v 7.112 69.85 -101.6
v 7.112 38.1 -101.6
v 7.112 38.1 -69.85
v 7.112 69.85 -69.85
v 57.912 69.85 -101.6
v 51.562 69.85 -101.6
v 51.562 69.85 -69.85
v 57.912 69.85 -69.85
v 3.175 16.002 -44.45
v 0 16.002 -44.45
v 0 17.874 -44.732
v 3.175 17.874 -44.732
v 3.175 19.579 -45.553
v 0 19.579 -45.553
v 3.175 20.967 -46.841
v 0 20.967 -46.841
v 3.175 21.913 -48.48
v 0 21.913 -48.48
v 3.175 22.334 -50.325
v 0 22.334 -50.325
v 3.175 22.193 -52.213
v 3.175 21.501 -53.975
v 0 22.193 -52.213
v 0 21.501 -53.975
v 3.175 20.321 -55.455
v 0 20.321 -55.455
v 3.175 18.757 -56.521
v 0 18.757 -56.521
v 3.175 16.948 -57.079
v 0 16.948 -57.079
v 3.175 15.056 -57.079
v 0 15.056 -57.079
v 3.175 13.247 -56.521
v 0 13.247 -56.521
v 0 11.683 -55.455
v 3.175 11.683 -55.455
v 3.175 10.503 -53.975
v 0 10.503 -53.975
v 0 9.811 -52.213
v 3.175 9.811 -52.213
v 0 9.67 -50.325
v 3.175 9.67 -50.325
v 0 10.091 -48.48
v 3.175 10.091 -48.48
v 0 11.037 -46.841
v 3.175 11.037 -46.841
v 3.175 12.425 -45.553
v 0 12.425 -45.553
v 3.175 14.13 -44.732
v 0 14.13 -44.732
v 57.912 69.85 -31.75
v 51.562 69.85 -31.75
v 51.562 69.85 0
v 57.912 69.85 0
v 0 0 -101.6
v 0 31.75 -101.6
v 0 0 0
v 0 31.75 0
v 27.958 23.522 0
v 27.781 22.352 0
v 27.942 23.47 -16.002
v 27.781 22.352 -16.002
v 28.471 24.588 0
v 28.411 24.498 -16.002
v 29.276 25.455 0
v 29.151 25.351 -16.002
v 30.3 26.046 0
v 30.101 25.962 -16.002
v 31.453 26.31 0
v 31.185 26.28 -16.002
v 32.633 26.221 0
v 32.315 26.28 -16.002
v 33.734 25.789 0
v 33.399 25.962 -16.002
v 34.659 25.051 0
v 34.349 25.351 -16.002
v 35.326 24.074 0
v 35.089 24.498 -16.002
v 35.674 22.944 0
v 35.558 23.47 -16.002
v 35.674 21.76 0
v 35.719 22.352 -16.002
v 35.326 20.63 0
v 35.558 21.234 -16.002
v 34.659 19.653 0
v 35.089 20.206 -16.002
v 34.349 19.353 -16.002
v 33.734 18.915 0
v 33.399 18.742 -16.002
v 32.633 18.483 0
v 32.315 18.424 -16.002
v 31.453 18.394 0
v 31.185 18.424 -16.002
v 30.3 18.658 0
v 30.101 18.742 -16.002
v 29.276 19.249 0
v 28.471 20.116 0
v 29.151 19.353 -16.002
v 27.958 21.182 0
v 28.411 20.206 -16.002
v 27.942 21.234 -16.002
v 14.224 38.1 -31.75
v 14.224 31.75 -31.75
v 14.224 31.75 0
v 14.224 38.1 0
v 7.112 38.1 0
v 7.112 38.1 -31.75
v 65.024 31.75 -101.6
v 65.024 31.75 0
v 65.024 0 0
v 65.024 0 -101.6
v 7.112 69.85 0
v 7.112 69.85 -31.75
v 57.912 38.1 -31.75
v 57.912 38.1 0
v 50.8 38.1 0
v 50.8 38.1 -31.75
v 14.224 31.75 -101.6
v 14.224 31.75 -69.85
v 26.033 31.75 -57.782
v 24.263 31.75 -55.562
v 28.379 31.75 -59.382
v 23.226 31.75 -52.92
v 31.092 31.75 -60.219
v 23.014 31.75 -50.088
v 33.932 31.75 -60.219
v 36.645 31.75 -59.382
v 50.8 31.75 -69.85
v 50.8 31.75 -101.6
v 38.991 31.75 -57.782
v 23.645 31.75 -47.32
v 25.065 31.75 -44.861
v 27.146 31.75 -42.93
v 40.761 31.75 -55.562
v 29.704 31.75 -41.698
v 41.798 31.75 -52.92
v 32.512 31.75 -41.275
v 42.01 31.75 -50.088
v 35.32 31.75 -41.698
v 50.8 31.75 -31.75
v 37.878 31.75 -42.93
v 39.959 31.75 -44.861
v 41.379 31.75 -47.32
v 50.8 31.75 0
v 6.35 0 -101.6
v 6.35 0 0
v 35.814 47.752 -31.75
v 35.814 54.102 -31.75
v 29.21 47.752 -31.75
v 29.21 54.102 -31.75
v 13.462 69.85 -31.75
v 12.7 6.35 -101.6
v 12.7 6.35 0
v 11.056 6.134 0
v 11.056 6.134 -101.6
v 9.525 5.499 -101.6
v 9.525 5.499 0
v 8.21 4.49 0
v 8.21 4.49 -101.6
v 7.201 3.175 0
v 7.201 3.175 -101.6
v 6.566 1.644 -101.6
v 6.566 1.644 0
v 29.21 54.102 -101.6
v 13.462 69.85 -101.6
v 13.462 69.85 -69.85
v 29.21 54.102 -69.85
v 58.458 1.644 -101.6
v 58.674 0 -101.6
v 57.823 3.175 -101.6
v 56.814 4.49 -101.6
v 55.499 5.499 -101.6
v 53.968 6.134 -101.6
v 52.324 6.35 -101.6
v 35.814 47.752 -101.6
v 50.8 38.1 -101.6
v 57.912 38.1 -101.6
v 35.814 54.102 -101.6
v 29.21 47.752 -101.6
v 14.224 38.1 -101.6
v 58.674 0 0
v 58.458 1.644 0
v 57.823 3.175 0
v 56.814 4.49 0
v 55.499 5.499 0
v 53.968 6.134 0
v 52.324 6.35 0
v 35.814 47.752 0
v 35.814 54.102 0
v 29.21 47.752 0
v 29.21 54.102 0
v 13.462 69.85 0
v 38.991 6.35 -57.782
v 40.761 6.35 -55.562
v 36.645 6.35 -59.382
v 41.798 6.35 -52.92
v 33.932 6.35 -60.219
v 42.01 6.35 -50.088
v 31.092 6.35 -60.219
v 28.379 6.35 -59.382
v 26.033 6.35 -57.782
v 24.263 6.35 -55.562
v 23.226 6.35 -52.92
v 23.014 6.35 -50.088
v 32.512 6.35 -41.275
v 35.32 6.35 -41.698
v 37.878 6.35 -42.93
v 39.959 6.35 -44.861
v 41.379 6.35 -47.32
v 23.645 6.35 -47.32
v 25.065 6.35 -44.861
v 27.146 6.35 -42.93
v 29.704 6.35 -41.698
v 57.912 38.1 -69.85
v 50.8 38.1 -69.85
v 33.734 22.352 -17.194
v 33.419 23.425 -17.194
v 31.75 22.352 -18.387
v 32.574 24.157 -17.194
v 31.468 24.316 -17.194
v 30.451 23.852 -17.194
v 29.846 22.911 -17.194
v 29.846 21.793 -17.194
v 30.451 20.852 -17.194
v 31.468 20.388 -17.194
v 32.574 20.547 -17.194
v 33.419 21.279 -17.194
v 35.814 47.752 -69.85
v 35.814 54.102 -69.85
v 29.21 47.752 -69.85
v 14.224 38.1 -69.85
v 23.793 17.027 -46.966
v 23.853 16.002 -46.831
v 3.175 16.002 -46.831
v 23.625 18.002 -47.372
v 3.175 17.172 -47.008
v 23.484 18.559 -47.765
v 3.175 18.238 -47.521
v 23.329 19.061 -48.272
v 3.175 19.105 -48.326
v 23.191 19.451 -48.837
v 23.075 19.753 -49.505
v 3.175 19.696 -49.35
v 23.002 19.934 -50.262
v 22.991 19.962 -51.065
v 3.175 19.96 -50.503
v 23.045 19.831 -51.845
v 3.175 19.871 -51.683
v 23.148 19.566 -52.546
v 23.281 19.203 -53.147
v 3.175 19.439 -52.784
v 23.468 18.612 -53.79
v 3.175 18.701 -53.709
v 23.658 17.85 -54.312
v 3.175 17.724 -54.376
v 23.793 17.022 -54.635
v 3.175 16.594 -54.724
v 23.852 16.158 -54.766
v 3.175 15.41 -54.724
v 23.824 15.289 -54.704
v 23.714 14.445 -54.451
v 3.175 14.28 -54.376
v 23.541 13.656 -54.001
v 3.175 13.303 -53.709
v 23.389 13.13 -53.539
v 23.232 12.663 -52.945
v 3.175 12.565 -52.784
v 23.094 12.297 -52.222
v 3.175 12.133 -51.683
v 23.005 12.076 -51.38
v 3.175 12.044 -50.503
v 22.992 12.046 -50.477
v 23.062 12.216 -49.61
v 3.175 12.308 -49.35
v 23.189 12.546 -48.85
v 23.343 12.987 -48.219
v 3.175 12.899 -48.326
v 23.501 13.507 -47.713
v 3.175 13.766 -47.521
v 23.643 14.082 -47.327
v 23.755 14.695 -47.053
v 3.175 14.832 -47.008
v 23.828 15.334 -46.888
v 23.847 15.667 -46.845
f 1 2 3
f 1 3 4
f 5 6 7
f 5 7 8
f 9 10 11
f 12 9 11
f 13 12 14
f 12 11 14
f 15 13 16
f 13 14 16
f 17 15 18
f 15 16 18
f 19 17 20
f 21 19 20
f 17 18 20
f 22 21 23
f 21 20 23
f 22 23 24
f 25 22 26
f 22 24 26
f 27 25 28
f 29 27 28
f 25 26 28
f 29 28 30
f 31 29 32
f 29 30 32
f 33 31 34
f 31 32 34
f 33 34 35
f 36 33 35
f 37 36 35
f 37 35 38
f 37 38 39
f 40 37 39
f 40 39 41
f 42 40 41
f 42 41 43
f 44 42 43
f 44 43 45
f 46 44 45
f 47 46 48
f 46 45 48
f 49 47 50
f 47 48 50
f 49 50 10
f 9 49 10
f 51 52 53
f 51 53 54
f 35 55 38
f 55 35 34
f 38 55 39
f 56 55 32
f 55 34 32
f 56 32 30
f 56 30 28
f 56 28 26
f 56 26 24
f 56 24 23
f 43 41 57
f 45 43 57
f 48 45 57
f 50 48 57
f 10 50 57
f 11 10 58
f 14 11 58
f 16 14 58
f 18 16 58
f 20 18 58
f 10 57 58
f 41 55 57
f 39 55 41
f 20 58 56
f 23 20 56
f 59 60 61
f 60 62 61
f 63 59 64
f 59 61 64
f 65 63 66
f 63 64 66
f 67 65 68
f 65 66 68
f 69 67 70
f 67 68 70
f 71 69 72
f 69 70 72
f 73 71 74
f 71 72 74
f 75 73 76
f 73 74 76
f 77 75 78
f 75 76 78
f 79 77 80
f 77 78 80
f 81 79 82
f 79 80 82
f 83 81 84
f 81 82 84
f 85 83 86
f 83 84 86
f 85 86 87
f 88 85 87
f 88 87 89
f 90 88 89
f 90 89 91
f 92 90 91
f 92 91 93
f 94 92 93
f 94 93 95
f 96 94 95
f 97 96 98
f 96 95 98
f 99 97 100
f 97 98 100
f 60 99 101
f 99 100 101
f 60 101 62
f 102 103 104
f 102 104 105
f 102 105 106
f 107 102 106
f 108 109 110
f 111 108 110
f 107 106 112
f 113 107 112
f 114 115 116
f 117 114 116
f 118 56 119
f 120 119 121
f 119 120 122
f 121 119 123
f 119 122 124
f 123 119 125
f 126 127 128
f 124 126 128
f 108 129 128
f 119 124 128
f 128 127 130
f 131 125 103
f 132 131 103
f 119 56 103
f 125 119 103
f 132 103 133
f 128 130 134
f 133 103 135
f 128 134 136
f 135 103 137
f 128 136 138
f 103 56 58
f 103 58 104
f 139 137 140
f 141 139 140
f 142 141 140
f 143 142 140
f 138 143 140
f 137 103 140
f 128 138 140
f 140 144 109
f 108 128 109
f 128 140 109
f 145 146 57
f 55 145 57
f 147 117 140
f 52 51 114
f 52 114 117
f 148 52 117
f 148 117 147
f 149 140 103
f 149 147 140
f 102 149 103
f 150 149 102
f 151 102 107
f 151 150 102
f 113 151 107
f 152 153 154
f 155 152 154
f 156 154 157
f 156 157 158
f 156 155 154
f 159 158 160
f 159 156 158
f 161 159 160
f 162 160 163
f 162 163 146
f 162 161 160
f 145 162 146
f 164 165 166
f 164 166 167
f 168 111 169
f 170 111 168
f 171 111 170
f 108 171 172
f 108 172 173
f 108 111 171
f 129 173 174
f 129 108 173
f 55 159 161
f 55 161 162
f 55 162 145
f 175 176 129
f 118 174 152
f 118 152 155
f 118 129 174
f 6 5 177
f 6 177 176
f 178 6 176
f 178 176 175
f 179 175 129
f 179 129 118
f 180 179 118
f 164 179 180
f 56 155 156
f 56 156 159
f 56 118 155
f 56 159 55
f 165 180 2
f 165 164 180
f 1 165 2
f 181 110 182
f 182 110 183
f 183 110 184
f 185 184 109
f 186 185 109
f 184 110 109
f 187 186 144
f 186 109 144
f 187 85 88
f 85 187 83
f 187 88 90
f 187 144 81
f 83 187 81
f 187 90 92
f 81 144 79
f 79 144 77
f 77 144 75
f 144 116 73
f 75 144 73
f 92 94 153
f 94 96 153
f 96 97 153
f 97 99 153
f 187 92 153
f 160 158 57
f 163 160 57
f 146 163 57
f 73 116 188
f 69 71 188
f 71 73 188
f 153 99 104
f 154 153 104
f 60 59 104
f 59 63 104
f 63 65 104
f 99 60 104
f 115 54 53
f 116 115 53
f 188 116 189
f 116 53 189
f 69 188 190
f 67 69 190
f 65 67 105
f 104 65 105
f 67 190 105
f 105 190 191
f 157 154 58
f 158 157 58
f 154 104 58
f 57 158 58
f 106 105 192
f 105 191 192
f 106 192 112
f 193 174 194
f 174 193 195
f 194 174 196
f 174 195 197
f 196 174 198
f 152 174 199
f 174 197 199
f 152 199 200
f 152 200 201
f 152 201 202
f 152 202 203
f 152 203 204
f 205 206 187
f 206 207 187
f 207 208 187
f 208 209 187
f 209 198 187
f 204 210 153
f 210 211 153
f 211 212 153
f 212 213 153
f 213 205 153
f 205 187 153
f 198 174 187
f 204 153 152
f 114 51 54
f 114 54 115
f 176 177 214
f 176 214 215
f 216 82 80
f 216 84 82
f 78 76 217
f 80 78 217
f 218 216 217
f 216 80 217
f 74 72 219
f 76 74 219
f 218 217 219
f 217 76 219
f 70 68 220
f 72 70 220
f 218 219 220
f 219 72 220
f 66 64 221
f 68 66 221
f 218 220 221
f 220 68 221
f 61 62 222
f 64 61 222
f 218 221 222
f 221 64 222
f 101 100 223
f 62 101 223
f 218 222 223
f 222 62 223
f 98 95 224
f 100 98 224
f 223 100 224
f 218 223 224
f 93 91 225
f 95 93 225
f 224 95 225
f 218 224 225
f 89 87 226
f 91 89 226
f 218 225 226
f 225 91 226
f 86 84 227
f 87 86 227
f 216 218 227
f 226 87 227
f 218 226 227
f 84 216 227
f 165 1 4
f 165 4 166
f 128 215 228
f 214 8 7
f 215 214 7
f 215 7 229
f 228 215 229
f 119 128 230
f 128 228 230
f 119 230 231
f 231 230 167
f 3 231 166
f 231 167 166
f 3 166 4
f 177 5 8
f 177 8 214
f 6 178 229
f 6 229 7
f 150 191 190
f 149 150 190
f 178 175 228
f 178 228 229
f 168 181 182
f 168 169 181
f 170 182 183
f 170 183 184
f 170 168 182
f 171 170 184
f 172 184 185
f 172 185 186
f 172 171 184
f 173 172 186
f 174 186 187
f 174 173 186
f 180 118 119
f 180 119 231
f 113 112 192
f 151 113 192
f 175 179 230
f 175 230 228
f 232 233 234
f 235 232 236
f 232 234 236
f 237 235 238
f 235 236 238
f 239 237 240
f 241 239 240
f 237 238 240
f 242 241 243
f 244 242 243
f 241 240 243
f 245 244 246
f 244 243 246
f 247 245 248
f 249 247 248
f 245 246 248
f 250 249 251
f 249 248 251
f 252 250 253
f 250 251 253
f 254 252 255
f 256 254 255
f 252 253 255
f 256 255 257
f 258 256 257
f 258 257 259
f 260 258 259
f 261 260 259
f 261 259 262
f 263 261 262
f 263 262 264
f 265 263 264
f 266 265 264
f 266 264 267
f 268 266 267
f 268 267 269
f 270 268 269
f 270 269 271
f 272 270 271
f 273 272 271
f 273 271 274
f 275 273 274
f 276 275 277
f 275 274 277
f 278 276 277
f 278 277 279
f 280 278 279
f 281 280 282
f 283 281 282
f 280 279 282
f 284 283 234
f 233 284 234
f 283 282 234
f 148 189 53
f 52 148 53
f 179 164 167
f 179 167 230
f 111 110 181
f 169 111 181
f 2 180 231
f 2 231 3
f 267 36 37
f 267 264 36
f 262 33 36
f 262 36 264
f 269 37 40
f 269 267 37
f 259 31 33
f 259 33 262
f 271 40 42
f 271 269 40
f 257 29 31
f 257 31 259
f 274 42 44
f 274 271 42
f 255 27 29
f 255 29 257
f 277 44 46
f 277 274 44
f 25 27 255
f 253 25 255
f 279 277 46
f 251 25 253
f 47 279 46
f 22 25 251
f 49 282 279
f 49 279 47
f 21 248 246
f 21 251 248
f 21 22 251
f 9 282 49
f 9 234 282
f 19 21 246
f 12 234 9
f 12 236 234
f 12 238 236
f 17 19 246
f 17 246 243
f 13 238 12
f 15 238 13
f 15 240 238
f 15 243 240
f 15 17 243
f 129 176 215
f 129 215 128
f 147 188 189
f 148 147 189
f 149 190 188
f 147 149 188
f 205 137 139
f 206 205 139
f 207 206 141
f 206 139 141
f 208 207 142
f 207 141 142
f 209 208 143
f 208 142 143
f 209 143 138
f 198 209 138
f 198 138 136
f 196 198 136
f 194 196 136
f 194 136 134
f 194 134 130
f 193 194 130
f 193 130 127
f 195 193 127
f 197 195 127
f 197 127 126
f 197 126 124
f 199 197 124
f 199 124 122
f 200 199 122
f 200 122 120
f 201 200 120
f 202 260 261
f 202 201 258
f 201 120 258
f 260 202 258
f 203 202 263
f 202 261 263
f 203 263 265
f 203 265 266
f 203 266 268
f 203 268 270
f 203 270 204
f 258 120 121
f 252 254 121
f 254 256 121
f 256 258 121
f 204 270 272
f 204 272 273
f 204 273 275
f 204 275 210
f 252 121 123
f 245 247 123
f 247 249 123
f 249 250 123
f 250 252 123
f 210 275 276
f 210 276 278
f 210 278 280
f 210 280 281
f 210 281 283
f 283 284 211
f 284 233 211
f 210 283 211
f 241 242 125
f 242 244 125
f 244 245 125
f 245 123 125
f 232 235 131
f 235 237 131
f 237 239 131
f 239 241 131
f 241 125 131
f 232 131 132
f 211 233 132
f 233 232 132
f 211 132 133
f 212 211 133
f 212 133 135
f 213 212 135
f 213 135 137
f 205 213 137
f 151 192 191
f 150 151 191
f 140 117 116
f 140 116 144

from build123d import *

# Parameters (mm, degrees)
BOSS_EXTRUDE1_DEPTH          = 101.6
FILLET1_R                    = 6.35
F_3_8_16_TAPPED_HOLE2_D      = 7.9375
F_3_8_16_TAPPED_HOLE2_DEPTH  = 16.002
F_3_8_16_TAPPED_HOLE2_TIP    = 2.384665582
SKETCH7_R                    = 9.525
CUT_EXTRUDE1_DEPTH           = 125.734690748
BOSS_EXTRUDE2_DEPTH          = 31.75
BOSS_EXTRUDE3_START          = -101.6
BOSS_EXTRUDE3_DEPTH          = 31.75
SKETCH9_R                    = 6.35
CUT_EXTRUDE2_DEPTH           = 3.175
F_3_8_16_TAPPED_HOLE3_REACH  = 139.938
F_3_8_16_TAPPED_HOLE3_BORE_R = 3.96875


with BuildPart() as part:
    # Sketch1 → Boss-Extrude1 (new body)
    with BuildSketch(Plane.XY):
        Polygon((0, 0), (0, 31.75), (65.024, 31.75), (65.024, 0), (58.674, 0), (58.674, 6.35), (6.35, 6.35), (6.35, 0), align=None)
    extrude(amount=-BOSS_EXTRUDE1_DEPTH)

    # Fillet1
    fillet1_edges = [part.edges().sort_by_distance(p)[0] for p in [
        (58.674, 6.35, -50.8),
        (6.35, 6.35, -50.8),
    ]]
    fillet(fillet1_edges, radius=FILLET1_R - 0.0001)  # a hair under: the kernel refuses the full size

    # 3/8-16 Tapped Hole2
    with Locations(Plane.XY):
        with Locations((31.75, 22.352)):
            Hole(F_3_8_16_TAPPED_HOLE2_D / 2, depth=F_3_8_16_TAPPED_HOLE2_DEPTH)
            with Locations((0, 0, -(F_3_8_16_TAPPED_HOLE2_DEPTH + F_3_8_16_TAPPED_HOLE2_TIP / 2))):  # 118° drill point
                Cone(0, F_3_8_16_TAPPED_HOLE2_D / 2, F_3_8_16_TAPPED_HOLE2_TIP, mode=Mode.SUBTRACT)

    # Sketch7 → Cut-Extrude1 (cut, through all)
    with BuildSketch(Plane(origin=(0, 31.75, 0), x_dir=(1, 0, 0), z_dir=(0, 1, 0))):
        with Locations(Location((32.512, 50.8, 0), (0, 0, 270))):
            Circle(SKETCH7_R)
    extrude(amount=-CUT_EXTRUDE1_DEPTH, mode=Mode.SUBTRACT)

    # Sketch8 → Boss-Extrude2 (add)
    with BuildSketch(Plane.XY):
        Polygon((14.224, 31.75), (14.224, 38.1), (7.112, 38.1), (7.112, 69.85), (13.462, 69.85), (29.21, 54.102), (29.21, 47.752), (35.814, 47.752), (35.814, 54.102), (51.562, 69.85), (57.912, 69.85), (57.912, 38.1), (50.8, 38.1), (50.8, 31.75), align=None)
    extrude(amount=-BOSS_EXTRUDE2_DEPTH)

    # Sketch8<3> → Boss-Extrude3 (add)
    with BuildSketch(Plane.XY.offset(BOSS_EXTRUDE3_START)):
        Polygon((14.224, 31.75), (14.224, 38.1), (7.112, 38.1), (7.112, 69.85), (13.462, 69.85), (29.21, 54.102), (29.21, 47.752), (35.814, 47.752), (35.814, 54.102), (51.562, 69.85), (57.912, 69.85), (57.912, 38.1), (50.8, 38.1), (50.8, 31.75), align=None)
    extrude(amount=BOSS_EXTRUDE3_DEPTH)

    # Sketch9 → Cut-Extrude2 (cut)
    with BuildSketch(Plane.ZY):
        with Locations((-50.8, 16.002)):
            Circle(SKETCH9_R)
    extrude(amount=-CUT_EXTRUDE2_DEPTH, mode=Mode.SUBTRACT)

    # 3/8-16 Tapped Hole3 bore → 3/8-16 Tapped Hole3 (cut, up to next)
    with BuildSketch(Plane.ZY.offset(-3.175), mode=Mode.PRIVATE) as f_3_8_16_tapped_hole3_sk1:
        with Locations((-50.8, 16.002)):
            Circle(F_3_8_16_TAPPED_HOLE3_BORE_R)
    f_3_8_16_tapped_hole3_tool1 = extrude(f_3_8_16_tapped_hole3_sk1.sketch, amount=-F_3_8_16_TAPPED_HOLE3_REACH, mode=Mode.PRIVATE) & part.part
    add(f_3_8_16_tapped_hole3_tool1.solids().sort_by_distance((3.175, 16.002, -50.8))[0], mode=Mode.SUBTRACT)


solid = part.part
